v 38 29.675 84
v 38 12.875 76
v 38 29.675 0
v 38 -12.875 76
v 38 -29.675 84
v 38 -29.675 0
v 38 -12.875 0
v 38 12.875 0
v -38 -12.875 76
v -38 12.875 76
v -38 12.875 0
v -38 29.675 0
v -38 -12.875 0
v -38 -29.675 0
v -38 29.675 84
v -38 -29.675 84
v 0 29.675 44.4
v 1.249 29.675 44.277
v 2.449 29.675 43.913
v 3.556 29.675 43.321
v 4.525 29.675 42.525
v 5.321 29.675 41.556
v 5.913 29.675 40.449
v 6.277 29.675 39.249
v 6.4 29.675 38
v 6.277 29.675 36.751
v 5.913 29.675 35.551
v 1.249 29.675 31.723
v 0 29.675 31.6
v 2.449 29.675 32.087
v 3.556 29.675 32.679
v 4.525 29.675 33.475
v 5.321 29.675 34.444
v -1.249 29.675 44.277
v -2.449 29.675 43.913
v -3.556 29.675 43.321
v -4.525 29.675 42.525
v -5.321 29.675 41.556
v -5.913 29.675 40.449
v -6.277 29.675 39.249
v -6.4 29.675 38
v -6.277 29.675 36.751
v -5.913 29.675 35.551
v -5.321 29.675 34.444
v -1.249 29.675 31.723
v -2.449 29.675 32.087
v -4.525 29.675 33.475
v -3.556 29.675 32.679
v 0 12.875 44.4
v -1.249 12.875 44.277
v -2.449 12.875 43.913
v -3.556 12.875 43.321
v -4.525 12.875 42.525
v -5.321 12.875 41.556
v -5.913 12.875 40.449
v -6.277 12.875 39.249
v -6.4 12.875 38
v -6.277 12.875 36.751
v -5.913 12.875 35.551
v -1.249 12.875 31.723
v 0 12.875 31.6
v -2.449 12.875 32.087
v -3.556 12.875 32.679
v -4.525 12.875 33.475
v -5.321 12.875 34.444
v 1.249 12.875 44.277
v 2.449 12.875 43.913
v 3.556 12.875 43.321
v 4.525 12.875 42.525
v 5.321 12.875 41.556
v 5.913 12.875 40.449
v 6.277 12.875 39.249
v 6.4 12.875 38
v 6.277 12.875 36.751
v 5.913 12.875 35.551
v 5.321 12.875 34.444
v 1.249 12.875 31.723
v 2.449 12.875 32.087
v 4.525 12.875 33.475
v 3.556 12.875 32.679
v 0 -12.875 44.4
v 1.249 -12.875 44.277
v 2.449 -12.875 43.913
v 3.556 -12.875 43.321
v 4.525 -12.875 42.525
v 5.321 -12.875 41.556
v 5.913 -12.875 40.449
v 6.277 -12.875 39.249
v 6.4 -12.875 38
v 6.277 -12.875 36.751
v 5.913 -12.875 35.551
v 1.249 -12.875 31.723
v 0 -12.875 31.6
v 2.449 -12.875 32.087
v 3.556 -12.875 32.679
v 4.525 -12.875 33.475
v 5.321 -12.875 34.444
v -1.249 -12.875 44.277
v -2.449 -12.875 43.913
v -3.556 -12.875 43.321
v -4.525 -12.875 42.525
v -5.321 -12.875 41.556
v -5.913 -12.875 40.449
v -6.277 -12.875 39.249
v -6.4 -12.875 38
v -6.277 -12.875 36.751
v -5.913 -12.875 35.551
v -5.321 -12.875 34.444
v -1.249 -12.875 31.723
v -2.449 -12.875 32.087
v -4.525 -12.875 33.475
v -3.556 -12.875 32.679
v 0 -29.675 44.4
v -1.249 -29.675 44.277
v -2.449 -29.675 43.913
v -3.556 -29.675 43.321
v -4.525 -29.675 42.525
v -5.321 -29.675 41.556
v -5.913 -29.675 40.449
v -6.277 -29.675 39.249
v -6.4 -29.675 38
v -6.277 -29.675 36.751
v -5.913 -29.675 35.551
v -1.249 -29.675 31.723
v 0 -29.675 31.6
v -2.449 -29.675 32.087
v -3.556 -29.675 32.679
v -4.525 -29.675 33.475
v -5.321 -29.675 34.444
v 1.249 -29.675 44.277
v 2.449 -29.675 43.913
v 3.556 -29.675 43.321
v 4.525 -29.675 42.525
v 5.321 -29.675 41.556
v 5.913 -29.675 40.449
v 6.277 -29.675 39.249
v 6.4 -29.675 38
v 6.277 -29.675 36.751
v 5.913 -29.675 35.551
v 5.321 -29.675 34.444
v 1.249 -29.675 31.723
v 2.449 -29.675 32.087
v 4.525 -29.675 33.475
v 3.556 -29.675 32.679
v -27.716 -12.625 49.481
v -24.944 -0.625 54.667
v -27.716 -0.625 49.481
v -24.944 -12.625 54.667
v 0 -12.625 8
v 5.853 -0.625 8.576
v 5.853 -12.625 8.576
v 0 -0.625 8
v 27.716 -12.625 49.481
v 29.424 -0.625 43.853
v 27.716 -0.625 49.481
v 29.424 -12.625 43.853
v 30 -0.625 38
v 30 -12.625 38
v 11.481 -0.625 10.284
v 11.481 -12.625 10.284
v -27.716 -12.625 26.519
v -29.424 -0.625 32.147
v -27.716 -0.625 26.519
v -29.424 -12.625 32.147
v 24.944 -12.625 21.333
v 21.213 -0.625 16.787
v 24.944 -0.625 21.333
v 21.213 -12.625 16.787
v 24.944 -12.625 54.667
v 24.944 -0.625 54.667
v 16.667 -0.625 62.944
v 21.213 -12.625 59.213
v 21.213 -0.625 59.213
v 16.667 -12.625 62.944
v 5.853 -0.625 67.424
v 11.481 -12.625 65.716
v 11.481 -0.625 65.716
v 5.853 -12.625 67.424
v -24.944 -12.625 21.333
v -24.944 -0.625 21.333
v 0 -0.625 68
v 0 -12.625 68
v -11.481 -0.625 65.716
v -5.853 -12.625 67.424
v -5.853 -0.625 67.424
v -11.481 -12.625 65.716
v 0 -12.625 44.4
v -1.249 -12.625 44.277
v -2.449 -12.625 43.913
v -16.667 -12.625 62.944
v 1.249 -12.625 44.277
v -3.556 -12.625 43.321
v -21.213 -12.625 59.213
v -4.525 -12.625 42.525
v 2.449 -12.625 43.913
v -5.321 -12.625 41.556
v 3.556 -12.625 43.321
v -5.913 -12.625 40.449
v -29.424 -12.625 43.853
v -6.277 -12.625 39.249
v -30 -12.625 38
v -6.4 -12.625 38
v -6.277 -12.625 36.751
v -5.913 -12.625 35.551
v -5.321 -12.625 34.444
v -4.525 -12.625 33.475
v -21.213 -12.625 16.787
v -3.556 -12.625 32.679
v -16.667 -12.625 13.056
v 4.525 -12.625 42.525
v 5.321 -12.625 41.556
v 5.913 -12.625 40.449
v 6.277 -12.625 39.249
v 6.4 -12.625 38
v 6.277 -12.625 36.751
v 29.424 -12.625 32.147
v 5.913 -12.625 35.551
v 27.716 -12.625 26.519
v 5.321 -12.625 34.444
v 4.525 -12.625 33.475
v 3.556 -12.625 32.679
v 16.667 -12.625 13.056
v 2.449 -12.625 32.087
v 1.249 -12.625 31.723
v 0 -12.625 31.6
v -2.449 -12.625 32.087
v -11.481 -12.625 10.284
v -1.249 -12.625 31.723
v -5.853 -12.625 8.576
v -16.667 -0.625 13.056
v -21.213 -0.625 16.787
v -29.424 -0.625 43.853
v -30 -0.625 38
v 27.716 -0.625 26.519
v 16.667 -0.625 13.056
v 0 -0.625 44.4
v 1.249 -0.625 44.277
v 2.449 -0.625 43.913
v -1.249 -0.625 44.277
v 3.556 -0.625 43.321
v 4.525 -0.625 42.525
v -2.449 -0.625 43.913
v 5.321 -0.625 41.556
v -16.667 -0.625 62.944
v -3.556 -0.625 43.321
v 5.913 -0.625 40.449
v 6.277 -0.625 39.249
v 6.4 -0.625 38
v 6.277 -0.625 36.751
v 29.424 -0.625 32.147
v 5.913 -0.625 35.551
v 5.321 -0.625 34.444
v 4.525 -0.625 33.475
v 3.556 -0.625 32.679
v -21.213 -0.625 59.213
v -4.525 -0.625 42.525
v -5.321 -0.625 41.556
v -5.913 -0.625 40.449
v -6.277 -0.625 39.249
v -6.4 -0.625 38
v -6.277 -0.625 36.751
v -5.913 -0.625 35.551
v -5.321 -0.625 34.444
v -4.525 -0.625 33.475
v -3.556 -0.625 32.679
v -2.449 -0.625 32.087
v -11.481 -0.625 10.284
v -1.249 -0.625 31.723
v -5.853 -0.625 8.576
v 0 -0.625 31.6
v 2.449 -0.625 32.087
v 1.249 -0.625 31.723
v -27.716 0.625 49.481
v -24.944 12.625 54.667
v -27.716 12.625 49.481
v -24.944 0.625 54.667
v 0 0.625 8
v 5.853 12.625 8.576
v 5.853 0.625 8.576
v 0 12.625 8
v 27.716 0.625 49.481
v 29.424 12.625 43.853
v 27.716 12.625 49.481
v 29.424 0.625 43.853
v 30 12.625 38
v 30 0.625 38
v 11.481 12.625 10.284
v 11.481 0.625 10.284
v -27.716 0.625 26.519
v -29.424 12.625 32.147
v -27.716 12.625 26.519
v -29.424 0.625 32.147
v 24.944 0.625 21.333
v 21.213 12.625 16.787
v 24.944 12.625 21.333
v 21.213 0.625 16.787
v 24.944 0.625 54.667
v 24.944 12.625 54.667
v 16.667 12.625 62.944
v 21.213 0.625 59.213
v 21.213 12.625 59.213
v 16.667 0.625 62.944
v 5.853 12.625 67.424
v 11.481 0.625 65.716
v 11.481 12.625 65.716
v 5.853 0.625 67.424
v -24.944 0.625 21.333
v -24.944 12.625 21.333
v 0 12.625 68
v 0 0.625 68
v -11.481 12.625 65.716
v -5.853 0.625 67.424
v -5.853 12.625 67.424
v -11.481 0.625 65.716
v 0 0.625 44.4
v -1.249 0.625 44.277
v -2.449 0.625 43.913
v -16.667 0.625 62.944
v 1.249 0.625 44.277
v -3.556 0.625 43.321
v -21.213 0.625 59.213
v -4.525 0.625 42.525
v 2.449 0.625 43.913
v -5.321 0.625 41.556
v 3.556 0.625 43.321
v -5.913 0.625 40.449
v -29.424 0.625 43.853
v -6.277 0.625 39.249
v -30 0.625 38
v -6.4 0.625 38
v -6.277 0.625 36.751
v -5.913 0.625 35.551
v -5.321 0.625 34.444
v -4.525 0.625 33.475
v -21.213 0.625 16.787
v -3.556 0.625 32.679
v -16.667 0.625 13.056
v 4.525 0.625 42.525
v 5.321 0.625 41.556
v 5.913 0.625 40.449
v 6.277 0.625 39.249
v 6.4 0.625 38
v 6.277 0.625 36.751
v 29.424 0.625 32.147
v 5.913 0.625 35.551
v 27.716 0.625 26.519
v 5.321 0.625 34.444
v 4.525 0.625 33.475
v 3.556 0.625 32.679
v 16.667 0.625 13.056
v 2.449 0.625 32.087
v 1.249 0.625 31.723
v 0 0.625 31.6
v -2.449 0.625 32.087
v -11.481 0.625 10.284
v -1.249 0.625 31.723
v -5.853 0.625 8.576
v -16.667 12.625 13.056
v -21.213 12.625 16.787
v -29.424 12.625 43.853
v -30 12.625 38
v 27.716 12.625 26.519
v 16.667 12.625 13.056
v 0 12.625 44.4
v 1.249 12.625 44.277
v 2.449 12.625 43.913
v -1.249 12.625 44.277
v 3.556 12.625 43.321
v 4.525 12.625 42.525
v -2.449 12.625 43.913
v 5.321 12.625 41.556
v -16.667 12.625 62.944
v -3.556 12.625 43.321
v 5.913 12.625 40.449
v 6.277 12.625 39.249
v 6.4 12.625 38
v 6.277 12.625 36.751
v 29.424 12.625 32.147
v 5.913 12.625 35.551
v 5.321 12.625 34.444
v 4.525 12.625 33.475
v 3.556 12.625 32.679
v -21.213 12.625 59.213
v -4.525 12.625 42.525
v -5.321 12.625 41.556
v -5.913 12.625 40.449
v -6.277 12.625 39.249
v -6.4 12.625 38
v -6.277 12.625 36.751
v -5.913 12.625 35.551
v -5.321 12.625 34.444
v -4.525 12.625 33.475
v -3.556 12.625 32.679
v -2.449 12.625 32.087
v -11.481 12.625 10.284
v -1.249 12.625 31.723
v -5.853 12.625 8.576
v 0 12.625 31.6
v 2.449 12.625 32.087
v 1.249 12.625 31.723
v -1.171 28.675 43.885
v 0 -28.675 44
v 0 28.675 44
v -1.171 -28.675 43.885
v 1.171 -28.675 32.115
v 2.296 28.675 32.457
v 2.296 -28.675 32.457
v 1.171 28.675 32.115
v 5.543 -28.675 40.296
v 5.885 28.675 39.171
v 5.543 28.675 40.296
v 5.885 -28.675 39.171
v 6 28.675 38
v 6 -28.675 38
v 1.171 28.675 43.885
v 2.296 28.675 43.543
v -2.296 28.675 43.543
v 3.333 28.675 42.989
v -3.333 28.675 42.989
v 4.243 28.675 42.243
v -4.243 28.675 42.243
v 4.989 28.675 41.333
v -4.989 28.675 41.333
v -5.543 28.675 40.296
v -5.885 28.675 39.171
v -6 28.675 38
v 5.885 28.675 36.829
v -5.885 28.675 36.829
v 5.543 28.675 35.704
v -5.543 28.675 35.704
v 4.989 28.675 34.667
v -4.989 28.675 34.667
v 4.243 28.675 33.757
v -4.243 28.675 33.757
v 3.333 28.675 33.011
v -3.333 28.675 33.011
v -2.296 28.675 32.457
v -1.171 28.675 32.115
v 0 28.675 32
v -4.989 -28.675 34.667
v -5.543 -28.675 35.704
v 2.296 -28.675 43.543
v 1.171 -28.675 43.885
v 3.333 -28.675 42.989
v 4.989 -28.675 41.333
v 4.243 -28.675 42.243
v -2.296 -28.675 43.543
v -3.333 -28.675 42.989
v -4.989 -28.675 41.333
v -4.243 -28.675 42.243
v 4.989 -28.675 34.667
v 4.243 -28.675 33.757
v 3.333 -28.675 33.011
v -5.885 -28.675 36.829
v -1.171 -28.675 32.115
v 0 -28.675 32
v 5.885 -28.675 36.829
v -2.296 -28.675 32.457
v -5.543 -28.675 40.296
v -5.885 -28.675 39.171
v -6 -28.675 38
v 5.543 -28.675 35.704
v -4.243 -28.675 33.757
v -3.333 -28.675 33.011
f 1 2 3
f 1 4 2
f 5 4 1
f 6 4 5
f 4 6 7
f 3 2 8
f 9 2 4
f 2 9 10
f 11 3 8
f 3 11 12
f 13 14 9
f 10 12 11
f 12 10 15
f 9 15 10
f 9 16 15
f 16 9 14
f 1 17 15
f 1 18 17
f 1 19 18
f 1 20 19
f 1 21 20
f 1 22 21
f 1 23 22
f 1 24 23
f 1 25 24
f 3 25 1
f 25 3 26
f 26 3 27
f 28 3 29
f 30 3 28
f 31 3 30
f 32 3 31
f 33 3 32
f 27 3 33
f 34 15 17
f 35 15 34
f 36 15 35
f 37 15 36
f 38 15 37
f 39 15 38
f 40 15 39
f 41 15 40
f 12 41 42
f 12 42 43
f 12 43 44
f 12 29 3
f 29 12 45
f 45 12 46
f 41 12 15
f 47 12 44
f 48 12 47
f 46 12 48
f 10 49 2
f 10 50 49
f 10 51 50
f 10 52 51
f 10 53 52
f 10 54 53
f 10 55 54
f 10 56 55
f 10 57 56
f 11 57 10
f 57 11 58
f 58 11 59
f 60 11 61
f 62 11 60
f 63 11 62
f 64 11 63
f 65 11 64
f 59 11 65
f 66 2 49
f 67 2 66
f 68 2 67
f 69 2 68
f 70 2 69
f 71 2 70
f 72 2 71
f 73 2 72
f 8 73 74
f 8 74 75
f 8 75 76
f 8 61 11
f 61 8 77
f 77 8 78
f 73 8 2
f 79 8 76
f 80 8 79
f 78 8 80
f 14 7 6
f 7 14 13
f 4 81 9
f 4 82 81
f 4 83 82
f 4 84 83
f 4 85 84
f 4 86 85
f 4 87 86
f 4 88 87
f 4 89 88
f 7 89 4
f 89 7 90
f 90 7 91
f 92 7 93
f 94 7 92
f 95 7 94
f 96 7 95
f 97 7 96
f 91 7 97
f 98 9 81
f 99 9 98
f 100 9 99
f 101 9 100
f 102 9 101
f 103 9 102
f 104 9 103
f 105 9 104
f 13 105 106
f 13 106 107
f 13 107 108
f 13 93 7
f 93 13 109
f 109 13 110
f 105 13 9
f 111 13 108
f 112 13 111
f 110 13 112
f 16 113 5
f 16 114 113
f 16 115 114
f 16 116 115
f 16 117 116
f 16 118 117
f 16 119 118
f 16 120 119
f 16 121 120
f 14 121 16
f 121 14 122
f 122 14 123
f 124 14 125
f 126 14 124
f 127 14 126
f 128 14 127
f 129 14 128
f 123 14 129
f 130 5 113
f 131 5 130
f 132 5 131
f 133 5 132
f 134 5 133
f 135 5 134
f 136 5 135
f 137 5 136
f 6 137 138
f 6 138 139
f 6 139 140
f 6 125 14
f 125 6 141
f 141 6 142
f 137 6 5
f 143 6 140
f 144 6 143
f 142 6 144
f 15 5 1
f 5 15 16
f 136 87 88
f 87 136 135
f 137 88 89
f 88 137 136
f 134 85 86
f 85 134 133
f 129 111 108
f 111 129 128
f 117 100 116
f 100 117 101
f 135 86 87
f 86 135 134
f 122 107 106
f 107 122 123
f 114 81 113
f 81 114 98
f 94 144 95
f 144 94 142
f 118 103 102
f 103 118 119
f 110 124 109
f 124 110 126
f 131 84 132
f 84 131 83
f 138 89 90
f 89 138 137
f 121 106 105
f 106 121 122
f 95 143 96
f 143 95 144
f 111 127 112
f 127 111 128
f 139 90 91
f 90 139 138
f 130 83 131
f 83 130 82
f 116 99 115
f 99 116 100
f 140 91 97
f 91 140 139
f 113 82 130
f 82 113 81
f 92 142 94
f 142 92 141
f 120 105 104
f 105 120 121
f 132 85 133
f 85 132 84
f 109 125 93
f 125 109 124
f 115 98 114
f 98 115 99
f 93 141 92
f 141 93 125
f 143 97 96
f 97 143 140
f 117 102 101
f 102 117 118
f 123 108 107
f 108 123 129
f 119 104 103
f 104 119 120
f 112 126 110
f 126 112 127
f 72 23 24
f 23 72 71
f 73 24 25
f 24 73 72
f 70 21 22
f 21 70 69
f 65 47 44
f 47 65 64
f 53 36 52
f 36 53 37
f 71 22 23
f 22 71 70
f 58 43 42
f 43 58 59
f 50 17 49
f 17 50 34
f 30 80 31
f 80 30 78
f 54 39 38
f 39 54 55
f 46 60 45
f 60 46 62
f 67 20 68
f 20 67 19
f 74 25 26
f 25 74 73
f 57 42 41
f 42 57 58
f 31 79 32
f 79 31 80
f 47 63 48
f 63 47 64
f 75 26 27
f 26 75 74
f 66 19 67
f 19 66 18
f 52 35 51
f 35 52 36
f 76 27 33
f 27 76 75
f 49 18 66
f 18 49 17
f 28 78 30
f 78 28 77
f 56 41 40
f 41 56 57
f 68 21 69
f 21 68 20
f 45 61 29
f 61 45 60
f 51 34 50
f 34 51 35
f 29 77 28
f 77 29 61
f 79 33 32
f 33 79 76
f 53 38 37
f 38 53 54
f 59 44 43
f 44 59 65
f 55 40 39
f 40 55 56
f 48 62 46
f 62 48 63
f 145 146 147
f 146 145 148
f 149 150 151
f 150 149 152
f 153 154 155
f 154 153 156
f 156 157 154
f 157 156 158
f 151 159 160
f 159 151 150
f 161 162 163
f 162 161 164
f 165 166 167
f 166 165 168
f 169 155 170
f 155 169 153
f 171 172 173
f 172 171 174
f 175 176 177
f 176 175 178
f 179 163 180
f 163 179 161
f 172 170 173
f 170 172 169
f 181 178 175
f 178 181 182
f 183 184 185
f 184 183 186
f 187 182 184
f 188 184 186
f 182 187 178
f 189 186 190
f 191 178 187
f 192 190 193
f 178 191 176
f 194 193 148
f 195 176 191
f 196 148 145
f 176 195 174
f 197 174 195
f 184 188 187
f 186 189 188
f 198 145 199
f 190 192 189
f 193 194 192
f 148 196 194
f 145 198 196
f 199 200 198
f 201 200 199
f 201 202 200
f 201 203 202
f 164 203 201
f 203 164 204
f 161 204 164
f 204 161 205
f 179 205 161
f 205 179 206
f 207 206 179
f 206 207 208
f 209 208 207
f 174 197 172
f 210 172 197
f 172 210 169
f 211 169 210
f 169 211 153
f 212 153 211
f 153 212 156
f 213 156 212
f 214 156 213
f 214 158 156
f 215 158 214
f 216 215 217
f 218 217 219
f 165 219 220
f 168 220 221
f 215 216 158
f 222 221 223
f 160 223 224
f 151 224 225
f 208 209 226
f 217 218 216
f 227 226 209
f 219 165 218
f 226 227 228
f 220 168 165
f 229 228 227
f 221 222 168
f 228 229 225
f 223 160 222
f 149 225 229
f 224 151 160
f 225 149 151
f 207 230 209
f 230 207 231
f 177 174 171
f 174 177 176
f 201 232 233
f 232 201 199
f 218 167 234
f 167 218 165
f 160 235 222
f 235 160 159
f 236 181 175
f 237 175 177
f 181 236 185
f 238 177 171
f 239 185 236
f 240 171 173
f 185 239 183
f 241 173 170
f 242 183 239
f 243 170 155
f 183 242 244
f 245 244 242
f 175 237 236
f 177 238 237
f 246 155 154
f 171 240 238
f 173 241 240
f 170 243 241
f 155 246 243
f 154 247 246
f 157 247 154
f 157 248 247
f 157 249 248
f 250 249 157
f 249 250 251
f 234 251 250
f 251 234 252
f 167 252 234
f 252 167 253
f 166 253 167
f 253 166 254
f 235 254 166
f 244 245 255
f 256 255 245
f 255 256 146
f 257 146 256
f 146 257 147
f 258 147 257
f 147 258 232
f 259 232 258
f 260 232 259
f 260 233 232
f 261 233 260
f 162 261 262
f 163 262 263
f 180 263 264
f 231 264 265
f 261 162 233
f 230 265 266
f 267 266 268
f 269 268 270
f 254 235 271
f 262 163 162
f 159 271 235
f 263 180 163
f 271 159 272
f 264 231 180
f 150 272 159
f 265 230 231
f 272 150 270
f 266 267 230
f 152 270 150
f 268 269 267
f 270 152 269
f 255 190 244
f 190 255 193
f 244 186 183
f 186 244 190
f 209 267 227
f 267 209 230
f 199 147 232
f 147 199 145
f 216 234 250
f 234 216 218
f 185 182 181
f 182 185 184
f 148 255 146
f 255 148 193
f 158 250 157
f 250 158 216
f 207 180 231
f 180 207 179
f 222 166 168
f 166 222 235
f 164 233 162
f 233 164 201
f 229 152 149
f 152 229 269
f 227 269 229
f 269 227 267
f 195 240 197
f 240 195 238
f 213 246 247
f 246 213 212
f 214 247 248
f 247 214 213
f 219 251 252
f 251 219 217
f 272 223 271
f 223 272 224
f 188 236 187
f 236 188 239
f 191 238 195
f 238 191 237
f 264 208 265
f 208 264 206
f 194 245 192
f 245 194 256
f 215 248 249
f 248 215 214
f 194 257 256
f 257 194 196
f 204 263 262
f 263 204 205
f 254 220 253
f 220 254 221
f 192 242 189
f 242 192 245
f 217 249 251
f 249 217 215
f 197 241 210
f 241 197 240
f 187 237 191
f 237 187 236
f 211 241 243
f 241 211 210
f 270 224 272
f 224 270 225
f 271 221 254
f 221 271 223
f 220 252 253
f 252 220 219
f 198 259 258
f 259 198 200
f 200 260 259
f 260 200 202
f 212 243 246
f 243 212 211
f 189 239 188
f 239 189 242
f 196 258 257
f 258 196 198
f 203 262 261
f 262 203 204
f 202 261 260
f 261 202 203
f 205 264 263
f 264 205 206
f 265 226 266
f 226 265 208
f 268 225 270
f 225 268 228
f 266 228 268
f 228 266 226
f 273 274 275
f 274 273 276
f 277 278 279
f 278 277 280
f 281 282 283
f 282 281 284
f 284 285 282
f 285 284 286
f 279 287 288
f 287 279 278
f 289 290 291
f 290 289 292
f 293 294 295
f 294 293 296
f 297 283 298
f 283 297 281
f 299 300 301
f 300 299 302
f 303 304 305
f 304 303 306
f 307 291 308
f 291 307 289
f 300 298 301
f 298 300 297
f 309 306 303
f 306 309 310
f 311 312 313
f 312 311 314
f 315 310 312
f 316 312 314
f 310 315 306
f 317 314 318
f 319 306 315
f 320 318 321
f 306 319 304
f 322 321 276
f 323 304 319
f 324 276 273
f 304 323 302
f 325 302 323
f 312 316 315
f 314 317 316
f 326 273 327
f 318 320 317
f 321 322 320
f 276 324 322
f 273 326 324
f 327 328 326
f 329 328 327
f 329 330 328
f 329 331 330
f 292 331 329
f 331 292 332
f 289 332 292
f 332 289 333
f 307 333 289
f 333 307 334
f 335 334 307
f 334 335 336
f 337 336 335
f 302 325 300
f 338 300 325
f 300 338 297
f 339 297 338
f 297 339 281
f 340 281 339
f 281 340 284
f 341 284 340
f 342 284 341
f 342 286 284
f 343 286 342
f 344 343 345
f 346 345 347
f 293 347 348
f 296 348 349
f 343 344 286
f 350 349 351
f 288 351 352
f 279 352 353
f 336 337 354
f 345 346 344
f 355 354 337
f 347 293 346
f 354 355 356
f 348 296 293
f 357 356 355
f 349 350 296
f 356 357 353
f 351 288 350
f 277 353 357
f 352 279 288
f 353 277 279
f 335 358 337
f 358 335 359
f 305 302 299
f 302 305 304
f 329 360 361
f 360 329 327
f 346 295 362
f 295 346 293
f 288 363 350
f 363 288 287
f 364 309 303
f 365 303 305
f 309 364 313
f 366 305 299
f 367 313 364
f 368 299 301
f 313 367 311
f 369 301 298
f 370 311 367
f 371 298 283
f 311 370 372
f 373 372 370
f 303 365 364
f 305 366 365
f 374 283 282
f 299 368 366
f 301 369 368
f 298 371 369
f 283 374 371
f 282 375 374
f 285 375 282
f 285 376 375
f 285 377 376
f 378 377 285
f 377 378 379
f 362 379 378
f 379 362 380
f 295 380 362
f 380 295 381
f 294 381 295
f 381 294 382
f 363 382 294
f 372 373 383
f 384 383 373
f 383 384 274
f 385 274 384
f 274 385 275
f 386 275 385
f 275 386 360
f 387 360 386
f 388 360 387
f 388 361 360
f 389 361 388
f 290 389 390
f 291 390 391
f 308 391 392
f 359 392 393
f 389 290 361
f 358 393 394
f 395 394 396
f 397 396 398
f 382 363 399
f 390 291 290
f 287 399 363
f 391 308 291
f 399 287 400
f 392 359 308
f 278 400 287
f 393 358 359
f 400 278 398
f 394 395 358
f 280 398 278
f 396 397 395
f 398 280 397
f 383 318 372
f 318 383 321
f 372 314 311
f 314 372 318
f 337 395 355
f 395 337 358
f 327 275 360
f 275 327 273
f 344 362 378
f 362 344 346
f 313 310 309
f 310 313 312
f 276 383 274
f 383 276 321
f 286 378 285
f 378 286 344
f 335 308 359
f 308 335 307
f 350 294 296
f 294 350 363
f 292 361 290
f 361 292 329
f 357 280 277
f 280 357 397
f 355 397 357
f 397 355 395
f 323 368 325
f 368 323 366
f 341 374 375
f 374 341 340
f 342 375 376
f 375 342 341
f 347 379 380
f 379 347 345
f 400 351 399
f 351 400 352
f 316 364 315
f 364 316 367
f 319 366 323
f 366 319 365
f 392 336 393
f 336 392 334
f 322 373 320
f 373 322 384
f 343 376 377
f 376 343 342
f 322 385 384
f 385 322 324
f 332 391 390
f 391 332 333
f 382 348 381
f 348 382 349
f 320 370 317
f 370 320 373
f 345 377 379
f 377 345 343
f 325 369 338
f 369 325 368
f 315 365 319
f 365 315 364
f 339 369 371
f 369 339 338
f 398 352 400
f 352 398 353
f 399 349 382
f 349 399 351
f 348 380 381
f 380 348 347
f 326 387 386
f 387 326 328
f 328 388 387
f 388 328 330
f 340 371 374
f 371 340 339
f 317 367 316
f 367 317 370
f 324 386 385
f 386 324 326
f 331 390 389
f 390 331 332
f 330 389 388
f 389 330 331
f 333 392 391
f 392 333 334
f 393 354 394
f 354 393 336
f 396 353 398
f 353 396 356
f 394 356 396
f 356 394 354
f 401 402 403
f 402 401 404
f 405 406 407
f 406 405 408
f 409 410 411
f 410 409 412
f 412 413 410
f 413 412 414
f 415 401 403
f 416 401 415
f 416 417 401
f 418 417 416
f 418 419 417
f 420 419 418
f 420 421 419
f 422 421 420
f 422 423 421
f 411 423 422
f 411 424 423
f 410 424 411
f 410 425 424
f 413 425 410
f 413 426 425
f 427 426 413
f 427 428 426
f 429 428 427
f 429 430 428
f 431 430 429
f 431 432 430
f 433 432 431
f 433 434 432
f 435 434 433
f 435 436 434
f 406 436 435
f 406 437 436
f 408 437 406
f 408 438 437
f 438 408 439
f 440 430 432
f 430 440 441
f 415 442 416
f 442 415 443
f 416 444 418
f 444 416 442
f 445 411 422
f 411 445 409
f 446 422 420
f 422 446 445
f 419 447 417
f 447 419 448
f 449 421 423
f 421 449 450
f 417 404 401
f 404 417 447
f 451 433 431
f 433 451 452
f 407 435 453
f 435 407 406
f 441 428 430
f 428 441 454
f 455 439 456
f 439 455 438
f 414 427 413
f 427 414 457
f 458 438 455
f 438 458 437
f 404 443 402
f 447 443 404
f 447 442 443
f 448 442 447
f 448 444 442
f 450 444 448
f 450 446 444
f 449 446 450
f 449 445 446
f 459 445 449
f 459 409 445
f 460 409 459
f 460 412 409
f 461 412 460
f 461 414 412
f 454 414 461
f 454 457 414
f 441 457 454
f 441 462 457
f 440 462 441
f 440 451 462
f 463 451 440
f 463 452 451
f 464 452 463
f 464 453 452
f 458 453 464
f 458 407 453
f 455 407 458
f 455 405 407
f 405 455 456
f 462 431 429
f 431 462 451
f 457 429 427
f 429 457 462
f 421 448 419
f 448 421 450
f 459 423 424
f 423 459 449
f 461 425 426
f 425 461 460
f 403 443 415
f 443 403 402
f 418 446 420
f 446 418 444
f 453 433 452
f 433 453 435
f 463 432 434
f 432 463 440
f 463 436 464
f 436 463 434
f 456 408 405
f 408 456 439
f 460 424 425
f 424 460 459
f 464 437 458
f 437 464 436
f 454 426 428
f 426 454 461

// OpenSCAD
$fn = 32;

// ------------------------------------------------------------------------
// Trolley wheel set: wheels d60, fork 76 mm tall
// Every part is its own module, assembly() places every instance.
// ------------------------------------------------------------------------

// --- part 1 ---
module trolley_fork() {
  difference() {
    union() {
      translate([-38, 12.875, 0]) cube([76, 16.8, 76]);
      translate([-38, -29.675, 0]) cube([76, 16.8, 76]);
      translate([-38, -29.675, 76]) cube([76, 59.35, 8]);
    }
    translate([0, -21.275, 38]) rotate([90, 0, 0]) cylinder(h = 18.8, d = 12.8, center = true);
    translate([0, 21.275, 38]) rotate([90, 0, 0]) cylinder(h = 18.8, d = 12.8, center = true);
  }
}

// --- part 2 ---
module trolley_wheel() {
  difference() {
      translate([0, 0, 0]) cylinder(h = 12, d = 60);
      translate([0, 0, -1]) cylinder(h = 14, d = 12.8);
    }
}

// --- part 3 ---
module trolley_axle() {
  translate([0, 0, -28.675]) cylinder(h = 57.35, d = 12);
}

// --- assembly ---
module assembly() {
  color([0.80, 0.24, 0.20]) translate([0, 0, 0]) rotate([0, 0, 0]) trolley_fork();
  color([0.20, 0.45, 0.75]) translate([0, -0.625, 38]) rotate([90, 0, 0]) trolley_wheel();
  color([0.25, 0.62, 0.32]) translate([0, 12.625, 38]) rotate([90, 0, 0]) trolley_wheel();
  color([0.92, 0.70, 0.18]) translate([0, 0, 38]) rotate([90, 0, 0]) trolley_axle();
}

assembly();
